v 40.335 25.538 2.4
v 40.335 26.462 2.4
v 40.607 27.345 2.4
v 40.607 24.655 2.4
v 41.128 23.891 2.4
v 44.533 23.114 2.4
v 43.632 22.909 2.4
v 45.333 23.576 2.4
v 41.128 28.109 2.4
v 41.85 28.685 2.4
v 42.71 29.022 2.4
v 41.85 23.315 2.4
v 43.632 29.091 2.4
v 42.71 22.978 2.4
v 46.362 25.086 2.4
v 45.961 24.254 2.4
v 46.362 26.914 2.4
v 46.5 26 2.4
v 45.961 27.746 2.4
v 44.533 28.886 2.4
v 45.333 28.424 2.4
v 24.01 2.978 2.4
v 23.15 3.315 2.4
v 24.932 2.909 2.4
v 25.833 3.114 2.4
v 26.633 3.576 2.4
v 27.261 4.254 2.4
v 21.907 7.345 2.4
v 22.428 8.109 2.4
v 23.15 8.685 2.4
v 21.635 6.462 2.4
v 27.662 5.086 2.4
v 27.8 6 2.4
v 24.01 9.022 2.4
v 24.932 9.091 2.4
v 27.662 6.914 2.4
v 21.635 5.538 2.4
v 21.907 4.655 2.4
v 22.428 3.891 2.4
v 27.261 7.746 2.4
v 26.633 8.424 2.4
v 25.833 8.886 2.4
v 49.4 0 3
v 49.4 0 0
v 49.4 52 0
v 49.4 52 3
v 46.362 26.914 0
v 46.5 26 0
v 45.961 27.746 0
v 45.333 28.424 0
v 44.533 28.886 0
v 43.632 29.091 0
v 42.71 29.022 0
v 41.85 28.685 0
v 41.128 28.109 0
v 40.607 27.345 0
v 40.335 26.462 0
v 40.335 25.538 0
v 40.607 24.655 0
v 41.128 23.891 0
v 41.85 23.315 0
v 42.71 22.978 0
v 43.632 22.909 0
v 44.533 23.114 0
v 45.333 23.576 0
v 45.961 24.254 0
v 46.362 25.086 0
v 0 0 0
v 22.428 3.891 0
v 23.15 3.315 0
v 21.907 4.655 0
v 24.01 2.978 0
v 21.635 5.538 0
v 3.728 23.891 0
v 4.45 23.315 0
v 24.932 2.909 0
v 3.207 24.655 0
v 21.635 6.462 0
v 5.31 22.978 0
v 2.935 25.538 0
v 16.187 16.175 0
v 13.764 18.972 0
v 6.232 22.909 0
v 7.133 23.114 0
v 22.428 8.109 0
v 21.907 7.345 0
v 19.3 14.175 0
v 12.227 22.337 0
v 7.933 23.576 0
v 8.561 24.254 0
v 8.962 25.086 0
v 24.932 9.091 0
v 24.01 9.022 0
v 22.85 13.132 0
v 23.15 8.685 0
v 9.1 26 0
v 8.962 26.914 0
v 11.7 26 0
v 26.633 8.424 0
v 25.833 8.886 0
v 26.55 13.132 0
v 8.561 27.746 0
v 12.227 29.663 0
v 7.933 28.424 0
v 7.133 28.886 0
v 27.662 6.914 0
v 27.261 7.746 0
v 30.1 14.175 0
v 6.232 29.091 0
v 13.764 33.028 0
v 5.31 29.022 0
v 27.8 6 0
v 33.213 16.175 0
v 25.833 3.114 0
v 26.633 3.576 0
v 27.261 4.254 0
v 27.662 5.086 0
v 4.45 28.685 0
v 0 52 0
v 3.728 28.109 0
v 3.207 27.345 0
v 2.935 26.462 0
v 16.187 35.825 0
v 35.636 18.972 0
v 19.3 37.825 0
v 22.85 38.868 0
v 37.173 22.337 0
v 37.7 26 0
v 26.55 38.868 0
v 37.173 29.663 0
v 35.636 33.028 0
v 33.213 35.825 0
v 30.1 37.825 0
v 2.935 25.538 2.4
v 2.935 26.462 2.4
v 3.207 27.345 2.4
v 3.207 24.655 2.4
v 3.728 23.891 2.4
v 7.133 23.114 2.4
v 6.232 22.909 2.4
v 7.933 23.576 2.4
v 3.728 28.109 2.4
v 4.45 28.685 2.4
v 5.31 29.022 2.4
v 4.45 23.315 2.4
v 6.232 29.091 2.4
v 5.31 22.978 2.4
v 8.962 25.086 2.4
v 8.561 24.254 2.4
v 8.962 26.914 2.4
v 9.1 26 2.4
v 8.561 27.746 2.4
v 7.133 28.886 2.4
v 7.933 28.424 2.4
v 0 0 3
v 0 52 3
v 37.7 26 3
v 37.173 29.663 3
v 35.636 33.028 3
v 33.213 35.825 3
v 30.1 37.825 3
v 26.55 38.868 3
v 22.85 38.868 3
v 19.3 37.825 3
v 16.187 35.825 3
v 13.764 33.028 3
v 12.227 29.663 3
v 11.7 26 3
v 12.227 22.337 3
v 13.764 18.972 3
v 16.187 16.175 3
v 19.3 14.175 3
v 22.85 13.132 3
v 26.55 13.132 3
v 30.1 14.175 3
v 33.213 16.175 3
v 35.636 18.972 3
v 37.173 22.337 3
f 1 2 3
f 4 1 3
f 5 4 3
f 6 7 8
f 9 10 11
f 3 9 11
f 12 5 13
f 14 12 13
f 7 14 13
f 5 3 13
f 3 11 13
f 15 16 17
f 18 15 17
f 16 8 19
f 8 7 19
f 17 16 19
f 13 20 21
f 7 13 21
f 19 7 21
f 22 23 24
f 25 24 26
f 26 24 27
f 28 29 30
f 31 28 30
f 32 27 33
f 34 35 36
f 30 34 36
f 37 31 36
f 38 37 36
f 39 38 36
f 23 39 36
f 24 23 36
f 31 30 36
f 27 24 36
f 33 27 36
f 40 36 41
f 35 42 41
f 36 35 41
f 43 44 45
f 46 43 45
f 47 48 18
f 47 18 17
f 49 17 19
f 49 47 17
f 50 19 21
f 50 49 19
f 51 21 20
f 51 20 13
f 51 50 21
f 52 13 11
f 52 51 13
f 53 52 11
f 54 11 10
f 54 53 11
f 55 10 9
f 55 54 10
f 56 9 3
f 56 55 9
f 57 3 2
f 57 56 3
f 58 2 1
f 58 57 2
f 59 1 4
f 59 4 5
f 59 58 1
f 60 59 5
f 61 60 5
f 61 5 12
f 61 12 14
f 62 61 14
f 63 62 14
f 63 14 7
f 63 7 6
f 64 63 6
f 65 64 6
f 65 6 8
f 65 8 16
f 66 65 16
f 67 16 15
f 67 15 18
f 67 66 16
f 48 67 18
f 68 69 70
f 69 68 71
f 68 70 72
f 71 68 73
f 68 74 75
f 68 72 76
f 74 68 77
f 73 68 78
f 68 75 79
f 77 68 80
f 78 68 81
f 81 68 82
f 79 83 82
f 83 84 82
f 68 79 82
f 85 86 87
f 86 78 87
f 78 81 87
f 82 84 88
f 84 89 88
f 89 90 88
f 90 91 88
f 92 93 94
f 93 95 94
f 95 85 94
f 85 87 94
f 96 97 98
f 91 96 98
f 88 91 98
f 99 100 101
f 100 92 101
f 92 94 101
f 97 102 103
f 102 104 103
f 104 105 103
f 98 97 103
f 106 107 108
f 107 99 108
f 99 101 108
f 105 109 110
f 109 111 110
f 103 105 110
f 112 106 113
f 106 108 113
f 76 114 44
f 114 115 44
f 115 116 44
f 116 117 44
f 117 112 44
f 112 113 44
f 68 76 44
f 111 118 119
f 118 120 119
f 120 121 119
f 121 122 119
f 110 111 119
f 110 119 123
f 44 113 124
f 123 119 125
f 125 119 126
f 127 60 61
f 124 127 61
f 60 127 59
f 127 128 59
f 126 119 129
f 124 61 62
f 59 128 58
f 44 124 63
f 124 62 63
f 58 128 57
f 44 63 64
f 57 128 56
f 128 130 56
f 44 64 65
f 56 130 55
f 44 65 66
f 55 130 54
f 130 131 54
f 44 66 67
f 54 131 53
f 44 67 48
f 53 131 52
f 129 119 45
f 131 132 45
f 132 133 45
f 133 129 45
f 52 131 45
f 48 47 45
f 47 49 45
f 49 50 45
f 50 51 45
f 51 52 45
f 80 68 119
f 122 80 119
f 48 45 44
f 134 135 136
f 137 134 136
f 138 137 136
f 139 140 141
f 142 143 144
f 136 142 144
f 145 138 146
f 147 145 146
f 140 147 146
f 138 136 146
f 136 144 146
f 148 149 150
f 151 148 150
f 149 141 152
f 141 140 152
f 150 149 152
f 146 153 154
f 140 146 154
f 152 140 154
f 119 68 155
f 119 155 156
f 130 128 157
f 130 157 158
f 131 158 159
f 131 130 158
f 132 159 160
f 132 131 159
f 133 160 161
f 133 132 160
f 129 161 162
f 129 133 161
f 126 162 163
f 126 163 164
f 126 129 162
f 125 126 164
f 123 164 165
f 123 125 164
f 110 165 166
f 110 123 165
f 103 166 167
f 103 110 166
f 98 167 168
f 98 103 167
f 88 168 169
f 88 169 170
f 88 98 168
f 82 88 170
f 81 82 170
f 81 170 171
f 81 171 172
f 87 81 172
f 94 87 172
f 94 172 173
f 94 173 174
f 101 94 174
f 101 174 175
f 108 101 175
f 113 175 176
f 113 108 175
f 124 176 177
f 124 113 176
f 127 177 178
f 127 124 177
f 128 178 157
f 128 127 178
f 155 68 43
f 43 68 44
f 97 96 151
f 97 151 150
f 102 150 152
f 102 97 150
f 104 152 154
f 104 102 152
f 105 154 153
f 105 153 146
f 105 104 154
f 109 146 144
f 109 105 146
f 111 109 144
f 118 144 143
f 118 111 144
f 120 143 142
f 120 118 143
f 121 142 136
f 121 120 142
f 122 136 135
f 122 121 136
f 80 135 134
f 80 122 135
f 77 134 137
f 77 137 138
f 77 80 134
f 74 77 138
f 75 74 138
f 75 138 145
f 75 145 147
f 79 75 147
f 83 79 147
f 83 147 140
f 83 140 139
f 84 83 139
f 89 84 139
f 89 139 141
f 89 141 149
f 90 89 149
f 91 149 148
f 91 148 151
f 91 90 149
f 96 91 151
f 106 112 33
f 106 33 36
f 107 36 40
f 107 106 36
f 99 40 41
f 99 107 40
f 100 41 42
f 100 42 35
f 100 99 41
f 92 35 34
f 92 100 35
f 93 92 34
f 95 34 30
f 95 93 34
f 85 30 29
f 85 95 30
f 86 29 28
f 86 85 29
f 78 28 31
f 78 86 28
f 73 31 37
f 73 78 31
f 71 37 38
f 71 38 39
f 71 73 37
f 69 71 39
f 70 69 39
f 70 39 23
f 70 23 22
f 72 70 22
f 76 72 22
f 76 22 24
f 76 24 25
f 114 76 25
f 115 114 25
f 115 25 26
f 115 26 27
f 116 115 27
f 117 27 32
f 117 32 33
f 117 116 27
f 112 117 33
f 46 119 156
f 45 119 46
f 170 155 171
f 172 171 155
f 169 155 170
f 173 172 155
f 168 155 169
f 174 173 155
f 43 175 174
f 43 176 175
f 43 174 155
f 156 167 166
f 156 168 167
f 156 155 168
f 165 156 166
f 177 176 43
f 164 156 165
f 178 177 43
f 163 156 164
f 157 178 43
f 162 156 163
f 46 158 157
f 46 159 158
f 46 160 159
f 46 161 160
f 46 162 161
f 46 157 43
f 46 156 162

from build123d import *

# Parameters (mm, degrees)
SKETCH_W     = 49.4
SKETCH_H     = 52
SKETCH_R     = 13
PAD_DEPTH    = 3
SKETCH001_R  = 3.1
POCKET_DEPTH = 2.4


with BuildPart() as part:
    # Sketch → Pad (new body)
    with BuildSketch(Plane.XY):
        with Locations((24.7, 26)):
            Rectangle(SKETCH_W, SKETCH_H)
        with Locations((24.7, 26)):
            Circle(SKETCH_R, mode=Mode.SUBTRACT)
    extrude(amount=PAD_DEPTH)

    # Sketch001 → Pocket (cut)
    with BuildSketch(Plane.XY):
        with Locations((24.7, 6)):
            Circle(SKETCH001_R)
        with Locations((6, 26)):
            Circle(SKETCH001_R)
        with Locations((43.4, 26)):
            Circle(SKETCH001_R)
    extrude(amount=POCKET_DEPTH, mode=Mode.SUBTRACT)


solid = part.part
